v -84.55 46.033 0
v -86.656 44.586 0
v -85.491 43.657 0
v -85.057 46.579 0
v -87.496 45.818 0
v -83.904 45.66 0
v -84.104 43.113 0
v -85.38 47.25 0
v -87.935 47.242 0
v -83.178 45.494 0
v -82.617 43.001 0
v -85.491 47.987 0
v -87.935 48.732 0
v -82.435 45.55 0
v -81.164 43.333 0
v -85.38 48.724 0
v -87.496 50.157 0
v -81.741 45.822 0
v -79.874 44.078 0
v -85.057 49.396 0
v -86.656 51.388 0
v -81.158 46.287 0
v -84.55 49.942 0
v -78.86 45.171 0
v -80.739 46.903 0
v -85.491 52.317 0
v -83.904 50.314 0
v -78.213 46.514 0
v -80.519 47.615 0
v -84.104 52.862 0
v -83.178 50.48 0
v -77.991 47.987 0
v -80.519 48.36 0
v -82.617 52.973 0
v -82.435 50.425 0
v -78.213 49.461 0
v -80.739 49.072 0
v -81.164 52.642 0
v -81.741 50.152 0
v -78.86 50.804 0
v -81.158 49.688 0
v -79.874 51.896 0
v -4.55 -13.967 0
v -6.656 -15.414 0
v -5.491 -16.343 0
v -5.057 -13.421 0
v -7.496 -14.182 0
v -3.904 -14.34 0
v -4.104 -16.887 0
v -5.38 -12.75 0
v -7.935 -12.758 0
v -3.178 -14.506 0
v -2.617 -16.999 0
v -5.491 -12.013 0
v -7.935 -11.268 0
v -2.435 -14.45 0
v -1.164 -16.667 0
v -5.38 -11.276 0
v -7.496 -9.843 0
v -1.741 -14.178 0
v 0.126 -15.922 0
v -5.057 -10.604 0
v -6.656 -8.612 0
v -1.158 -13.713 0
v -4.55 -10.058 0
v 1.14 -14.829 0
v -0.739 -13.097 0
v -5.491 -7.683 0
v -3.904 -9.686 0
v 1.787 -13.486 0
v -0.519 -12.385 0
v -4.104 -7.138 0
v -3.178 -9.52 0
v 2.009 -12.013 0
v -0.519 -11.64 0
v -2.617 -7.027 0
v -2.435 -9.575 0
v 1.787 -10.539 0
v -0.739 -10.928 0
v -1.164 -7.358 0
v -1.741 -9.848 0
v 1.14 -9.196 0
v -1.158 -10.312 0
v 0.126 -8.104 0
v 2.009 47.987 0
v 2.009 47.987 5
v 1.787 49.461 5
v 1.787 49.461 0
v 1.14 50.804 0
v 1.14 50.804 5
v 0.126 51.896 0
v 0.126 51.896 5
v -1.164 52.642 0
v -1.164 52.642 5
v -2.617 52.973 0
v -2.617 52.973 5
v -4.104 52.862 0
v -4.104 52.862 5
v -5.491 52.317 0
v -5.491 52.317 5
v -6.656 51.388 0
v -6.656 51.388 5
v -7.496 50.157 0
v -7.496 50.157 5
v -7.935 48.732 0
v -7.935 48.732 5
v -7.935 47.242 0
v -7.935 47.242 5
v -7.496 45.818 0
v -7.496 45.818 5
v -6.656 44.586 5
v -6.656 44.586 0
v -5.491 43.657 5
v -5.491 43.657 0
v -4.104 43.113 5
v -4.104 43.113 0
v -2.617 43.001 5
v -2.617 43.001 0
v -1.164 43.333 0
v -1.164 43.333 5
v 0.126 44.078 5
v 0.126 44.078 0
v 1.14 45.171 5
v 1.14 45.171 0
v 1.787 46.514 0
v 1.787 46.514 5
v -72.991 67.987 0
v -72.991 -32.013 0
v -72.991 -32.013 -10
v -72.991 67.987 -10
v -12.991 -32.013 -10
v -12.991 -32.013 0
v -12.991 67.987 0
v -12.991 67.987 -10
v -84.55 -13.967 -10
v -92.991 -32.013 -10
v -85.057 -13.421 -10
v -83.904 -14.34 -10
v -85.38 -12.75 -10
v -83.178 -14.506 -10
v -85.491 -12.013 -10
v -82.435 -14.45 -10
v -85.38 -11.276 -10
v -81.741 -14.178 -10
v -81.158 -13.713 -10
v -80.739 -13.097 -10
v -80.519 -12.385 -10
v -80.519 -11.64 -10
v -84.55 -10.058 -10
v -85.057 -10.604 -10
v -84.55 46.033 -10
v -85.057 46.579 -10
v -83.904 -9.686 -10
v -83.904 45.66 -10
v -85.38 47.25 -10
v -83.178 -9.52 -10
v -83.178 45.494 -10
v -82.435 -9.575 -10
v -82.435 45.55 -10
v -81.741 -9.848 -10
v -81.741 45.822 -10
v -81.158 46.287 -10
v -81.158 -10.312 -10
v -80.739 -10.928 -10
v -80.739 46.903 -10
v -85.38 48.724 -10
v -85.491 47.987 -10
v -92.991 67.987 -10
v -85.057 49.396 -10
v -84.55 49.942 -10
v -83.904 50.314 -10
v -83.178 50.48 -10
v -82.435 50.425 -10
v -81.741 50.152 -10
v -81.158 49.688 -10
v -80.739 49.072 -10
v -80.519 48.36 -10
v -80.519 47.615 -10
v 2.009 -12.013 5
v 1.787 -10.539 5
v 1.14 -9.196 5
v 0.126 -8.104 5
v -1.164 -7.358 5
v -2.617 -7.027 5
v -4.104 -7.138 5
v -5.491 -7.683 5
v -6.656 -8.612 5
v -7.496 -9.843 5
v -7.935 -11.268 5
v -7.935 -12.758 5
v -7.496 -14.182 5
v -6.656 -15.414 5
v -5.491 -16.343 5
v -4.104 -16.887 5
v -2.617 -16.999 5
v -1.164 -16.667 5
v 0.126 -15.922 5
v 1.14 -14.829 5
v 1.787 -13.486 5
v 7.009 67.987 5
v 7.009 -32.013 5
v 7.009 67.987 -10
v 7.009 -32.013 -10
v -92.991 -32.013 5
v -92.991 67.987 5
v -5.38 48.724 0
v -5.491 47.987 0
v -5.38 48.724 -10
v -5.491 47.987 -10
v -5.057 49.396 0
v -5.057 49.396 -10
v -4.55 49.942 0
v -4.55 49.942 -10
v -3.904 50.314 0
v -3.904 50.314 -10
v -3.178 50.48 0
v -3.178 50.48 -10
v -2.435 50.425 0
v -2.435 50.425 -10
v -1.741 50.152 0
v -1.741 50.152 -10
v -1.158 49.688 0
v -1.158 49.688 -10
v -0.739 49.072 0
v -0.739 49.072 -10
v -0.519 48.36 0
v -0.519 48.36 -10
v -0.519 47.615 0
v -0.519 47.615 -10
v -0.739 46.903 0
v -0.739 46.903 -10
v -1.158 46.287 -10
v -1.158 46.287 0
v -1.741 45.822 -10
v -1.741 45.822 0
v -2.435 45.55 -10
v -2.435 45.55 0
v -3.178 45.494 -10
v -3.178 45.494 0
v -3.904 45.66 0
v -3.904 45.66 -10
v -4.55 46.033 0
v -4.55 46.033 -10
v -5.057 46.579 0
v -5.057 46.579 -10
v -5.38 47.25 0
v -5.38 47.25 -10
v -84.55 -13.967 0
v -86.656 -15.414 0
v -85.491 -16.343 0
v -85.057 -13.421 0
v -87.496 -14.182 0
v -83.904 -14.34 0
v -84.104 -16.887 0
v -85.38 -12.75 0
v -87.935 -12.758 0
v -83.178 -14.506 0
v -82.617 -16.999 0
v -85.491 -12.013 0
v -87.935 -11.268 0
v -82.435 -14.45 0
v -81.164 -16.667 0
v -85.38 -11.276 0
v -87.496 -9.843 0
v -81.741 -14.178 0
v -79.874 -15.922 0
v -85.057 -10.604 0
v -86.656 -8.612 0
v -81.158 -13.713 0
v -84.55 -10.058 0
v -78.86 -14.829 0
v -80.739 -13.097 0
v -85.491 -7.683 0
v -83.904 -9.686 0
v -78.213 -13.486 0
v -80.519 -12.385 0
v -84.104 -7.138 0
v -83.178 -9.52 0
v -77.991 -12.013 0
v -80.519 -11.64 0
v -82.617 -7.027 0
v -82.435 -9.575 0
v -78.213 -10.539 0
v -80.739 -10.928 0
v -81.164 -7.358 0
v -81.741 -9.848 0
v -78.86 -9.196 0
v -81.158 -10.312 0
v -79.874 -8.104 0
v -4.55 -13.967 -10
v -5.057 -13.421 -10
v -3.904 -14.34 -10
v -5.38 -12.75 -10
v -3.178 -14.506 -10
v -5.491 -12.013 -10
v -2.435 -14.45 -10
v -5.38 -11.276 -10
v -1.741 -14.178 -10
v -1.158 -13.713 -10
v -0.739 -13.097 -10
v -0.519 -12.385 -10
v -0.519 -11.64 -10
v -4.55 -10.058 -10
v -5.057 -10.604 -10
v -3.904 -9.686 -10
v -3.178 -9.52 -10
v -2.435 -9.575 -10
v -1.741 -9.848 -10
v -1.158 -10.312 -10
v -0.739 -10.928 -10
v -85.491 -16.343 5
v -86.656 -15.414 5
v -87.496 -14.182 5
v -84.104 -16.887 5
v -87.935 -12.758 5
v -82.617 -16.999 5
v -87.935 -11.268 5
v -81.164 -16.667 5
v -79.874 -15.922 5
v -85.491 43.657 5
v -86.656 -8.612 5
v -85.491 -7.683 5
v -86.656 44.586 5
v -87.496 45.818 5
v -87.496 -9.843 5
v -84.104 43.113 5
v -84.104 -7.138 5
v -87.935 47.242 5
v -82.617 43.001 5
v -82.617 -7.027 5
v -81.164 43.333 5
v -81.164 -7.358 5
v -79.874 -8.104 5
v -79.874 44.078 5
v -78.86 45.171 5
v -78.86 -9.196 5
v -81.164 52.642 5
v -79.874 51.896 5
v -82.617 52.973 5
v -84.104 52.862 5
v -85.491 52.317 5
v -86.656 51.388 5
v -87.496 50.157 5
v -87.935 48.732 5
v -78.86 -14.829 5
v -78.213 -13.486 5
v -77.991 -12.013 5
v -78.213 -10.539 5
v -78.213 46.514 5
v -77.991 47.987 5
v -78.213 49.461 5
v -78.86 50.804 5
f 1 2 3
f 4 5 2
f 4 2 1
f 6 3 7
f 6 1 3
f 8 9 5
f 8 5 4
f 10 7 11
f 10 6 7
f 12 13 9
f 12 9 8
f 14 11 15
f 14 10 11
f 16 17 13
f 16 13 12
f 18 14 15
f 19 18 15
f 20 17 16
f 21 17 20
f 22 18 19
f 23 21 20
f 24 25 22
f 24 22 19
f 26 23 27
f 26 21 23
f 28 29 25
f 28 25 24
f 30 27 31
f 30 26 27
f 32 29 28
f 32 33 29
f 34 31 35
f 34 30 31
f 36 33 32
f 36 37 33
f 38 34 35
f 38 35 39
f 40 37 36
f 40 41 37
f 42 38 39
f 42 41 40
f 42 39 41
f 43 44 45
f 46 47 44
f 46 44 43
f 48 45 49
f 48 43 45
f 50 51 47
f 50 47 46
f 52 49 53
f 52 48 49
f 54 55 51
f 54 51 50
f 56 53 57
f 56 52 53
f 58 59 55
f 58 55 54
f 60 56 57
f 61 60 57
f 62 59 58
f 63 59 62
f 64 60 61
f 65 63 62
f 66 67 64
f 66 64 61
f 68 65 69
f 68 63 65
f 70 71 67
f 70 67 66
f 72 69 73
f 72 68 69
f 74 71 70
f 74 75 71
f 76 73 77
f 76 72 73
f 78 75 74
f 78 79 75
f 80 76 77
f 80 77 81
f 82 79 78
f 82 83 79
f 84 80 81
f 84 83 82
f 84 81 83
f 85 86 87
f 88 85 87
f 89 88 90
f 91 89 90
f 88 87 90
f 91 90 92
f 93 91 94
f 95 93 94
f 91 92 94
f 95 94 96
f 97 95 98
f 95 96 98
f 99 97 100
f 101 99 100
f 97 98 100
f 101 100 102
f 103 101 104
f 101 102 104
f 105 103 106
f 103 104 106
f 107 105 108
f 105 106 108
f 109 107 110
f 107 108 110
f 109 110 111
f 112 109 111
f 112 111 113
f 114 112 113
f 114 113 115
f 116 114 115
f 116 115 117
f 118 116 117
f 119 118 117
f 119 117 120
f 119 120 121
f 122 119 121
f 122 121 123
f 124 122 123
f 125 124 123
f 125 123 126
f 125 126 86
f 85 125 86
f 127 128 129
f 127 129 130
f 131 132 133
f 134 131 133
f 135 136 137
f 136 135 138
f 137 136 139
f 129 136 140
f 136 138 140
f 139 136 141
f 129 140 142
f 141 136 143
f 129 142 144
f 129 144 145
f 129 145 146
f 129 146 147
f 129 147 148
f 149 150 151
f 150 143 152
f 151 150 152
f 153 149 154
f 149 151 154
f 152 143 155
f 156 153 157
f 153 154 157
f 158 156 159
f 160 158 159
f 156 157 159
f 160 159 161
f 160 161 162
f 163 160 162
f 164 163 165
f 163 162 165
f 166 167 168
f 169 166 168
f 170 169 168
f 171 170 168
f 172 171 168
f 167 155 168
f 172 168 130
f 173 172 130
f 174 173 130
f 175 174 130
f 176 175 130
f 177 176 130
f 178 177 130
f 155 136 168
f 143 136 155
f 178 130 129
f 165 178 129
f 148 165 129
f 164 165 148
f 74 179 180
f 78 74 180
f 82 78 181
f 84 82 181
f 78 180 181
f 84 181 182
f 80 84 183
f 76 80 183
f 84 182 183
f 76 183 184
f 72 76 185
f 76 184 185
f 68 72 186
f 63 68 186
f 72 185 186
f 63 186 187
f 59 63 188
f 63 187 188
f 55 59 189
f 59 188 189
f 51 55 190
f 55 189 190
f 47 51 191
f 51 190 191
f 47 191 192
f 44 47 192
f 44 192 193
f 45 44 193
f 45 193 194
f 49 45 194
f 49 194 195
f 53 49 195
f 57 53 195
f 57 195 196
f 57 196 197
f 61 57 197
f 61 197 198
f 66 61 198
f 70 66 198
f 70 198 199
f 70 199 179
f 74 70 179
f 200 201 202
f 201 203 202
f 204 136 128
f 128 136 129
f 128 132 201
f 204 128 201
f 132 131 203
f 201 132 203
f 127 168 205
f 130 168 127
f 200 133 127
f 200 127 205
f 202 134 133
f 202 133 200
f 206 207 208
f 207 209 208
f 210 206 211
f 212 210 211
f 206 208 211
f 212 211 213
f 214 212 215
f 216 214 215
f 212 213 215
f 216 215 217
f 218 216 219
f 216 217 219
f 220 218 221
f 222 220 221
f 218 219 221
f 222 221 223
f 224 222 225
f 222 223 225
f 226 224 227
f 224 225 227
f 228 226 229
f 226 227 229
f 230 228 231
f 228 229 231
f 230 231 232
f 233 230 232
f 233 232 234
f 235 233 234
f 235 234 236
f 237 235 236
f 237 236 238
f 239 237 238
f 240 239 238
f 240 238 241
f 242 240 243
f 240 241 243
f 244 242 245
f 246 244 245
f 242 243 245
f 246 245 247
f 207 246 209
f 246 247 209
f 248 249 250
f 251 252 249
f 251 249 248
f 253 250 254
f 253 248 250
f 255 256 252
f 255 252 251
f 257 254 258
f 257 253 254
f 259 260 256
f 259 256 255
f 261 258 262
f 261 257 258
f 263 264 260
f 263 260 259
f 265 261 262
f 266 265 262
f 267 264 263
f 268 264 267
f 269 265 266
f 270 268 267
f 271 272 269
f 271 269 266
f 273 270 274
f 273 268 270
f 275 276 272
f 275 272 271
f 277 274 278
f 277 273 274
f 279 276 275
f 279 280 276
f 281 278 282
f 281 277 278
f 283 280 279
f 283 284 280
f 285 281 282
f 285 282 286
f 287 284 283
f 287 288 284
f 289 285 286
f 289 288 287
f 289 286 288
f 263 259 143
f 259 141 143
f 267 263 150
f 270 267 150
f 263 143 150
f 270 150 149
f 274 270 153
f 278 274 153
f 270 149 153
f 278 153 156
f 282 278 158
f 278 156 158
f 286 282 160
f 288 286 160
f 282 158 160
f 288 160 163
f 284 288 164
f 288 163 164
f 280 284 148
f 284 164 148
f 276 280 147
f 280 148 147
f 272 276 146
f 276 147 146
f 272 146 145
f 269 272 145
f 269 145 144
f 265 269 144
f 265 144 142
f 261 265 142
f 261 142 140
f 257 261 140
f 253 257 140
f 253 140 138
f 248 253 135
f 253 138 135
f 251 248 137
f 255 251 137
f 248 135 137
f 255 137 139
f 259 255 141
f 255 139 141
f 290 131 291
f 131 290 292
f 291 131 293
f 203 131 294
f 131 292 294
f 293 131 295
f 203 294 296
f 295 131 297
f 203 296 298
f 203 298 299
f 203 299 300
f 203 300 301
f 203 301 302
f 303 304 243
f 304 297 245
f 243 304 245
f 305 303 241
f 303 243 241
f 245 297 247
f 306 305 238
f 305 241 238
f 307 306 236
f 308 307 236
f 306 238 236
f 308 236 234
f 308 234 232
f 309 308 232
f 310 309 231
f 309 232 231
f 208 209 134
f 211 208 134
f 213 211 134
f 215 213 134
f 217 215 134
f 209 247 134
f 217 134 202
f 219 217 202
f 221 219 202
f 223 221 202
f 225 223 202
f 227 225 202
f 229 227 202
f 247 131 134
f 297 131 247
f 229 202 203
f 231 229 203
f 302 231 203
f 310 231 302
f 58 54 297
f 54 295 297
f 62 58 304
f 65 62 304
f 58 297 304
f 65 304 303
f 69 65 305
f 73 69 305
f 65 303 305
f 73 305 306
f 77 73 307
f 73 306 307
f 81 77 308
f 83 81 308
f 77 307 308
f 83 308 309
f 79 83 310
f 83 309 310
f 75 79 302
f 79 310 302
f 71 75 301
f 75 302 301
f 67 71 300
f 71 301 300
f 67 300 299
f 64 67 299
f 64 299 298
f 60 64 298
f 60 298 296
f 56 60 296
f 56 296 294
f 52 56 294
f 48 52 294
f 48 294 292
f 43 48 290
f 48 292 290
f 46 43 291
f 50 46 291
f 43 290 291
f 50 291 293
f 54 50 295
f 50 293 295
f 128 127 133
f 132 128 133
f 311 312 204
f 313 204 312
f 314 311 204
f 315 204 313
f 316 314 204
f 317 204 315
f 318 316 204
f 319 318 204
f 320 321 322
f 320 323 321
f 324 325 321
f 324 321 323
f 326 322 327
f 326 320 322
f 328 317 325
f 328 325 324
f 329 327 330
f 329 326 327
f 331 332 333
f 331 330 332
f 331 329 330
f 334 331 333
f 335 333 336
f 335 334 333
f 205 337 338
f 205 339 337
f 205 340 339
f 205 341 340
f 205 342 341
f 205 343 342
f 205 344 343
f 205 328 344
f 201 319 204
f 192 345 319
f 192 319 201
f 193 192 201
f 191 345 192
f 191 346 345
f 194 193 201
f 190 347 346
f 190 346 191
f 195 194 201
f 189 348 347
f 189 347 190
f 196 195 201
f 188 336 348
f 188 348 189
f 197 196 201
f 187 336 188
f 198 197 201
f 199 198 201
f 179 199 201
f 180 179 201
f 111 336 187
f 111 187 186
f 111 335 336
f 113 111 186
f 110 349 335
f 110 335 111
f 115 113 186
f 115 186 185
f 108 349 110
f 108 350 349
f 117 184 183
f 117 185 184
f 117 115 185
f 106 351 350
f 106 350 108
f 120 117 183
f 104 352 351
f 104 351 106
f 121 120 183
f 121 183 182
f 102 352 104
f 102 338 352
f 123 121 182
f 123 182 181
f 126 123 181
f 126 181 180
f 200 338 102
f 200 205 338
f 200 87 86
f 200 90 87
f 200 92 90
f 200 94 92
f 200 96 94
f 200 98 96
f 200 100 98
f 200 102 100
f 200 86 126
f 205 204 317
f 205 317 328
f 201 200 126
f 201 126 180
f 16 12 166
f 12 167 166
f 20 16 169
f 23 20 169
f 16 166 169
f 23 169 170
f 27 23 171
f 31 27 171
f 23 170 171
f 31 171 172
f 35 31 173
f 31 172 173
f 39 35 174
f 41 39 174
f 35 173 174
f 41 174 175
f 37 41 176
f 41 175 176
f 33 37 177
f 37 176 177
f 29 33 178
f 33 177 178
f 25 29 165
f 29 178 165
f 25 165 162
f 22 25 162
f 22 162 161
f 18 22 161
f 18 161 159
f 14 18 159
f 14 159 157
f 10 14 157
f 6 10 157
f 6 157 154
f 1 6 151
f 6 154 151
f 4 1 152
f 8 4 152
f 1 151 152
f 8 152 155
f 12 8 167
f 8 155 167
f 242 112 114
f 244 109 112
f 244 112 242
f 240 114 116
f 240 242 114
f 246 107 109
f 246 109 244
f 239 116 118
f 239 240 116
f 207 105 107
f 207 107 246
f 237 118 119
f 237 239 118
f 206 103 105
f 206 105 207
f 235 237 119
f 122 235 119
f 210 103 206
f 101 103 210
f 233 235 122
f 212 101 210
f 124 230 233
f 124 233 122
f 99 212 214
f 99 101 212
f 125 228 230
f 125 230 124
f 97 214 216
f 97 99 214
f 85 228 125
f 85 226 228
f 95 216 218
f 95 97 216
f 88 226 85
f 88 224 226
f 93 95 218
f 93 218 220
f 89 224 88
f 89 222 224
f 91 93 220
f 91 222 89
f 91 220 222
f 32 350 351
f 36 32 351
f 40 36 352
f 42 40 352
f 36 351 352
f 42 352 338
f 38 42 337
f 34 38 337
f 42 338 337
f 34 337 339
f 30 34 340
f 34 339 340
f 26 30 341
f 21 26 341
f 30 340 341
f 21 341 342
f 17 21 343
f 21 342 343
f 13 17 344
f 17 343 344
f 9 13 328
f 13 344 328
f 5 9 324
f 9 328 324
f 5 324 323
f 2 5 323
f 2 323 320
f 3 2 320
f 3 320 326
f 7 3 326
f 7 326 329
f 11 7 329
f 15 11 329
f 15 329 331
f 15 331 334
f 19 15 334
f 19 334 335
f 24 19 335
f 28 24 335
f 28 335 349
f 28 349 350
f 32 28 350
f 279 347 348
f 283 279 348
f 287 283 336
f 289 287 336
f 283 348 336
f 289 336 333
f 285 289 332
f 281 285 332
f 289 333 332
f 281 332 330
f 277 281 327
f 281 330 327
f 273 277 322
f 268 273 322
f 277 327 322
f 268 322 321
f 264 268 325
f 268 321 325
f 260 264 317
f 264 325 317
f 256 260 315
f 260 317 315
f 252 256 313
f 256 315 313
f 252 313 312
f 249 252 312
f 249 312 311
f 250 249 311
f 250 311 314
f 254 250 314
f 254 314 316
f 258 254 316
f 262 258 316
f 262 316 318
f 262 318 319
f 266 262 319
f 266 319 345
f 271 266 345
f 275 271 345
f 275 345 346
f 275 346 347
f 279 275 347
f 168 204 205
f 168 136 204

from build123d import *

# Parameters (mm, degrees)
F0_W           = 30
F0_H           = 100
F1_DEPTH       = 5
F0_W_2         = 20
F2_DEPTH       = 10
F2_DEPTH_BACK  = 5
F4_D           = 5
F4_DEPTH       = 30
F4_CBORE_D     = 10
F4_CBORE_DEPTH = 5
F4_TIP         = 1.5021515476


with BuildPart() as f1:
    # F0 (on Top) → F1 (new body)
    with BuildSketch(Plane.XY):
        with Locations((-57.9909870028, 17.9872823166)):
            Rectangle(F0_W, F0_H)
        with Locations((-27.9909870028, 17.9872823166)):
            Rectangle(F0_W, F0_H)
    extrude(amount=F1_DEPTH)

    # F0 (on Top) → F2 (join, two sides)
    with BuildSketch(Plane.XY) as f2_sk:
        with Locations((-82.9909870028, 17.9872823166)):
            Rectangle(F0_W_2, F0_H)
        with Locations((-2.9909870028, 17.9872823166)):
            Rectangle(F0_W_2, F0_H)
    extrude(amount=-F2_DEPTH)
    extrude(f2_sk.sketch, amount=F2_DEPTH_BACK)

    # F4
    with Locations(Plane.XY.offset(5)):
        with Locations((-82.9909870028, -12.0127176834), (-82.9909870028, 47.9872823166), (-2.9909870028, 47.9872823166), (-2.9909870028, -12.0127176834)):
            CounterBoreHole(F4_D / 2, F4_CBORE_D / 2, F4_CBORE_DEPTH, depth=F4_DEPTH)
            with Locations((0, 0, -(F4_DEPTH + F4_TIP / 2))):  # 118° drill point
                Cone(0, F4_D / 2, F4_TIP, mode=Mode.SUBTRACT)


solid = f1.part
